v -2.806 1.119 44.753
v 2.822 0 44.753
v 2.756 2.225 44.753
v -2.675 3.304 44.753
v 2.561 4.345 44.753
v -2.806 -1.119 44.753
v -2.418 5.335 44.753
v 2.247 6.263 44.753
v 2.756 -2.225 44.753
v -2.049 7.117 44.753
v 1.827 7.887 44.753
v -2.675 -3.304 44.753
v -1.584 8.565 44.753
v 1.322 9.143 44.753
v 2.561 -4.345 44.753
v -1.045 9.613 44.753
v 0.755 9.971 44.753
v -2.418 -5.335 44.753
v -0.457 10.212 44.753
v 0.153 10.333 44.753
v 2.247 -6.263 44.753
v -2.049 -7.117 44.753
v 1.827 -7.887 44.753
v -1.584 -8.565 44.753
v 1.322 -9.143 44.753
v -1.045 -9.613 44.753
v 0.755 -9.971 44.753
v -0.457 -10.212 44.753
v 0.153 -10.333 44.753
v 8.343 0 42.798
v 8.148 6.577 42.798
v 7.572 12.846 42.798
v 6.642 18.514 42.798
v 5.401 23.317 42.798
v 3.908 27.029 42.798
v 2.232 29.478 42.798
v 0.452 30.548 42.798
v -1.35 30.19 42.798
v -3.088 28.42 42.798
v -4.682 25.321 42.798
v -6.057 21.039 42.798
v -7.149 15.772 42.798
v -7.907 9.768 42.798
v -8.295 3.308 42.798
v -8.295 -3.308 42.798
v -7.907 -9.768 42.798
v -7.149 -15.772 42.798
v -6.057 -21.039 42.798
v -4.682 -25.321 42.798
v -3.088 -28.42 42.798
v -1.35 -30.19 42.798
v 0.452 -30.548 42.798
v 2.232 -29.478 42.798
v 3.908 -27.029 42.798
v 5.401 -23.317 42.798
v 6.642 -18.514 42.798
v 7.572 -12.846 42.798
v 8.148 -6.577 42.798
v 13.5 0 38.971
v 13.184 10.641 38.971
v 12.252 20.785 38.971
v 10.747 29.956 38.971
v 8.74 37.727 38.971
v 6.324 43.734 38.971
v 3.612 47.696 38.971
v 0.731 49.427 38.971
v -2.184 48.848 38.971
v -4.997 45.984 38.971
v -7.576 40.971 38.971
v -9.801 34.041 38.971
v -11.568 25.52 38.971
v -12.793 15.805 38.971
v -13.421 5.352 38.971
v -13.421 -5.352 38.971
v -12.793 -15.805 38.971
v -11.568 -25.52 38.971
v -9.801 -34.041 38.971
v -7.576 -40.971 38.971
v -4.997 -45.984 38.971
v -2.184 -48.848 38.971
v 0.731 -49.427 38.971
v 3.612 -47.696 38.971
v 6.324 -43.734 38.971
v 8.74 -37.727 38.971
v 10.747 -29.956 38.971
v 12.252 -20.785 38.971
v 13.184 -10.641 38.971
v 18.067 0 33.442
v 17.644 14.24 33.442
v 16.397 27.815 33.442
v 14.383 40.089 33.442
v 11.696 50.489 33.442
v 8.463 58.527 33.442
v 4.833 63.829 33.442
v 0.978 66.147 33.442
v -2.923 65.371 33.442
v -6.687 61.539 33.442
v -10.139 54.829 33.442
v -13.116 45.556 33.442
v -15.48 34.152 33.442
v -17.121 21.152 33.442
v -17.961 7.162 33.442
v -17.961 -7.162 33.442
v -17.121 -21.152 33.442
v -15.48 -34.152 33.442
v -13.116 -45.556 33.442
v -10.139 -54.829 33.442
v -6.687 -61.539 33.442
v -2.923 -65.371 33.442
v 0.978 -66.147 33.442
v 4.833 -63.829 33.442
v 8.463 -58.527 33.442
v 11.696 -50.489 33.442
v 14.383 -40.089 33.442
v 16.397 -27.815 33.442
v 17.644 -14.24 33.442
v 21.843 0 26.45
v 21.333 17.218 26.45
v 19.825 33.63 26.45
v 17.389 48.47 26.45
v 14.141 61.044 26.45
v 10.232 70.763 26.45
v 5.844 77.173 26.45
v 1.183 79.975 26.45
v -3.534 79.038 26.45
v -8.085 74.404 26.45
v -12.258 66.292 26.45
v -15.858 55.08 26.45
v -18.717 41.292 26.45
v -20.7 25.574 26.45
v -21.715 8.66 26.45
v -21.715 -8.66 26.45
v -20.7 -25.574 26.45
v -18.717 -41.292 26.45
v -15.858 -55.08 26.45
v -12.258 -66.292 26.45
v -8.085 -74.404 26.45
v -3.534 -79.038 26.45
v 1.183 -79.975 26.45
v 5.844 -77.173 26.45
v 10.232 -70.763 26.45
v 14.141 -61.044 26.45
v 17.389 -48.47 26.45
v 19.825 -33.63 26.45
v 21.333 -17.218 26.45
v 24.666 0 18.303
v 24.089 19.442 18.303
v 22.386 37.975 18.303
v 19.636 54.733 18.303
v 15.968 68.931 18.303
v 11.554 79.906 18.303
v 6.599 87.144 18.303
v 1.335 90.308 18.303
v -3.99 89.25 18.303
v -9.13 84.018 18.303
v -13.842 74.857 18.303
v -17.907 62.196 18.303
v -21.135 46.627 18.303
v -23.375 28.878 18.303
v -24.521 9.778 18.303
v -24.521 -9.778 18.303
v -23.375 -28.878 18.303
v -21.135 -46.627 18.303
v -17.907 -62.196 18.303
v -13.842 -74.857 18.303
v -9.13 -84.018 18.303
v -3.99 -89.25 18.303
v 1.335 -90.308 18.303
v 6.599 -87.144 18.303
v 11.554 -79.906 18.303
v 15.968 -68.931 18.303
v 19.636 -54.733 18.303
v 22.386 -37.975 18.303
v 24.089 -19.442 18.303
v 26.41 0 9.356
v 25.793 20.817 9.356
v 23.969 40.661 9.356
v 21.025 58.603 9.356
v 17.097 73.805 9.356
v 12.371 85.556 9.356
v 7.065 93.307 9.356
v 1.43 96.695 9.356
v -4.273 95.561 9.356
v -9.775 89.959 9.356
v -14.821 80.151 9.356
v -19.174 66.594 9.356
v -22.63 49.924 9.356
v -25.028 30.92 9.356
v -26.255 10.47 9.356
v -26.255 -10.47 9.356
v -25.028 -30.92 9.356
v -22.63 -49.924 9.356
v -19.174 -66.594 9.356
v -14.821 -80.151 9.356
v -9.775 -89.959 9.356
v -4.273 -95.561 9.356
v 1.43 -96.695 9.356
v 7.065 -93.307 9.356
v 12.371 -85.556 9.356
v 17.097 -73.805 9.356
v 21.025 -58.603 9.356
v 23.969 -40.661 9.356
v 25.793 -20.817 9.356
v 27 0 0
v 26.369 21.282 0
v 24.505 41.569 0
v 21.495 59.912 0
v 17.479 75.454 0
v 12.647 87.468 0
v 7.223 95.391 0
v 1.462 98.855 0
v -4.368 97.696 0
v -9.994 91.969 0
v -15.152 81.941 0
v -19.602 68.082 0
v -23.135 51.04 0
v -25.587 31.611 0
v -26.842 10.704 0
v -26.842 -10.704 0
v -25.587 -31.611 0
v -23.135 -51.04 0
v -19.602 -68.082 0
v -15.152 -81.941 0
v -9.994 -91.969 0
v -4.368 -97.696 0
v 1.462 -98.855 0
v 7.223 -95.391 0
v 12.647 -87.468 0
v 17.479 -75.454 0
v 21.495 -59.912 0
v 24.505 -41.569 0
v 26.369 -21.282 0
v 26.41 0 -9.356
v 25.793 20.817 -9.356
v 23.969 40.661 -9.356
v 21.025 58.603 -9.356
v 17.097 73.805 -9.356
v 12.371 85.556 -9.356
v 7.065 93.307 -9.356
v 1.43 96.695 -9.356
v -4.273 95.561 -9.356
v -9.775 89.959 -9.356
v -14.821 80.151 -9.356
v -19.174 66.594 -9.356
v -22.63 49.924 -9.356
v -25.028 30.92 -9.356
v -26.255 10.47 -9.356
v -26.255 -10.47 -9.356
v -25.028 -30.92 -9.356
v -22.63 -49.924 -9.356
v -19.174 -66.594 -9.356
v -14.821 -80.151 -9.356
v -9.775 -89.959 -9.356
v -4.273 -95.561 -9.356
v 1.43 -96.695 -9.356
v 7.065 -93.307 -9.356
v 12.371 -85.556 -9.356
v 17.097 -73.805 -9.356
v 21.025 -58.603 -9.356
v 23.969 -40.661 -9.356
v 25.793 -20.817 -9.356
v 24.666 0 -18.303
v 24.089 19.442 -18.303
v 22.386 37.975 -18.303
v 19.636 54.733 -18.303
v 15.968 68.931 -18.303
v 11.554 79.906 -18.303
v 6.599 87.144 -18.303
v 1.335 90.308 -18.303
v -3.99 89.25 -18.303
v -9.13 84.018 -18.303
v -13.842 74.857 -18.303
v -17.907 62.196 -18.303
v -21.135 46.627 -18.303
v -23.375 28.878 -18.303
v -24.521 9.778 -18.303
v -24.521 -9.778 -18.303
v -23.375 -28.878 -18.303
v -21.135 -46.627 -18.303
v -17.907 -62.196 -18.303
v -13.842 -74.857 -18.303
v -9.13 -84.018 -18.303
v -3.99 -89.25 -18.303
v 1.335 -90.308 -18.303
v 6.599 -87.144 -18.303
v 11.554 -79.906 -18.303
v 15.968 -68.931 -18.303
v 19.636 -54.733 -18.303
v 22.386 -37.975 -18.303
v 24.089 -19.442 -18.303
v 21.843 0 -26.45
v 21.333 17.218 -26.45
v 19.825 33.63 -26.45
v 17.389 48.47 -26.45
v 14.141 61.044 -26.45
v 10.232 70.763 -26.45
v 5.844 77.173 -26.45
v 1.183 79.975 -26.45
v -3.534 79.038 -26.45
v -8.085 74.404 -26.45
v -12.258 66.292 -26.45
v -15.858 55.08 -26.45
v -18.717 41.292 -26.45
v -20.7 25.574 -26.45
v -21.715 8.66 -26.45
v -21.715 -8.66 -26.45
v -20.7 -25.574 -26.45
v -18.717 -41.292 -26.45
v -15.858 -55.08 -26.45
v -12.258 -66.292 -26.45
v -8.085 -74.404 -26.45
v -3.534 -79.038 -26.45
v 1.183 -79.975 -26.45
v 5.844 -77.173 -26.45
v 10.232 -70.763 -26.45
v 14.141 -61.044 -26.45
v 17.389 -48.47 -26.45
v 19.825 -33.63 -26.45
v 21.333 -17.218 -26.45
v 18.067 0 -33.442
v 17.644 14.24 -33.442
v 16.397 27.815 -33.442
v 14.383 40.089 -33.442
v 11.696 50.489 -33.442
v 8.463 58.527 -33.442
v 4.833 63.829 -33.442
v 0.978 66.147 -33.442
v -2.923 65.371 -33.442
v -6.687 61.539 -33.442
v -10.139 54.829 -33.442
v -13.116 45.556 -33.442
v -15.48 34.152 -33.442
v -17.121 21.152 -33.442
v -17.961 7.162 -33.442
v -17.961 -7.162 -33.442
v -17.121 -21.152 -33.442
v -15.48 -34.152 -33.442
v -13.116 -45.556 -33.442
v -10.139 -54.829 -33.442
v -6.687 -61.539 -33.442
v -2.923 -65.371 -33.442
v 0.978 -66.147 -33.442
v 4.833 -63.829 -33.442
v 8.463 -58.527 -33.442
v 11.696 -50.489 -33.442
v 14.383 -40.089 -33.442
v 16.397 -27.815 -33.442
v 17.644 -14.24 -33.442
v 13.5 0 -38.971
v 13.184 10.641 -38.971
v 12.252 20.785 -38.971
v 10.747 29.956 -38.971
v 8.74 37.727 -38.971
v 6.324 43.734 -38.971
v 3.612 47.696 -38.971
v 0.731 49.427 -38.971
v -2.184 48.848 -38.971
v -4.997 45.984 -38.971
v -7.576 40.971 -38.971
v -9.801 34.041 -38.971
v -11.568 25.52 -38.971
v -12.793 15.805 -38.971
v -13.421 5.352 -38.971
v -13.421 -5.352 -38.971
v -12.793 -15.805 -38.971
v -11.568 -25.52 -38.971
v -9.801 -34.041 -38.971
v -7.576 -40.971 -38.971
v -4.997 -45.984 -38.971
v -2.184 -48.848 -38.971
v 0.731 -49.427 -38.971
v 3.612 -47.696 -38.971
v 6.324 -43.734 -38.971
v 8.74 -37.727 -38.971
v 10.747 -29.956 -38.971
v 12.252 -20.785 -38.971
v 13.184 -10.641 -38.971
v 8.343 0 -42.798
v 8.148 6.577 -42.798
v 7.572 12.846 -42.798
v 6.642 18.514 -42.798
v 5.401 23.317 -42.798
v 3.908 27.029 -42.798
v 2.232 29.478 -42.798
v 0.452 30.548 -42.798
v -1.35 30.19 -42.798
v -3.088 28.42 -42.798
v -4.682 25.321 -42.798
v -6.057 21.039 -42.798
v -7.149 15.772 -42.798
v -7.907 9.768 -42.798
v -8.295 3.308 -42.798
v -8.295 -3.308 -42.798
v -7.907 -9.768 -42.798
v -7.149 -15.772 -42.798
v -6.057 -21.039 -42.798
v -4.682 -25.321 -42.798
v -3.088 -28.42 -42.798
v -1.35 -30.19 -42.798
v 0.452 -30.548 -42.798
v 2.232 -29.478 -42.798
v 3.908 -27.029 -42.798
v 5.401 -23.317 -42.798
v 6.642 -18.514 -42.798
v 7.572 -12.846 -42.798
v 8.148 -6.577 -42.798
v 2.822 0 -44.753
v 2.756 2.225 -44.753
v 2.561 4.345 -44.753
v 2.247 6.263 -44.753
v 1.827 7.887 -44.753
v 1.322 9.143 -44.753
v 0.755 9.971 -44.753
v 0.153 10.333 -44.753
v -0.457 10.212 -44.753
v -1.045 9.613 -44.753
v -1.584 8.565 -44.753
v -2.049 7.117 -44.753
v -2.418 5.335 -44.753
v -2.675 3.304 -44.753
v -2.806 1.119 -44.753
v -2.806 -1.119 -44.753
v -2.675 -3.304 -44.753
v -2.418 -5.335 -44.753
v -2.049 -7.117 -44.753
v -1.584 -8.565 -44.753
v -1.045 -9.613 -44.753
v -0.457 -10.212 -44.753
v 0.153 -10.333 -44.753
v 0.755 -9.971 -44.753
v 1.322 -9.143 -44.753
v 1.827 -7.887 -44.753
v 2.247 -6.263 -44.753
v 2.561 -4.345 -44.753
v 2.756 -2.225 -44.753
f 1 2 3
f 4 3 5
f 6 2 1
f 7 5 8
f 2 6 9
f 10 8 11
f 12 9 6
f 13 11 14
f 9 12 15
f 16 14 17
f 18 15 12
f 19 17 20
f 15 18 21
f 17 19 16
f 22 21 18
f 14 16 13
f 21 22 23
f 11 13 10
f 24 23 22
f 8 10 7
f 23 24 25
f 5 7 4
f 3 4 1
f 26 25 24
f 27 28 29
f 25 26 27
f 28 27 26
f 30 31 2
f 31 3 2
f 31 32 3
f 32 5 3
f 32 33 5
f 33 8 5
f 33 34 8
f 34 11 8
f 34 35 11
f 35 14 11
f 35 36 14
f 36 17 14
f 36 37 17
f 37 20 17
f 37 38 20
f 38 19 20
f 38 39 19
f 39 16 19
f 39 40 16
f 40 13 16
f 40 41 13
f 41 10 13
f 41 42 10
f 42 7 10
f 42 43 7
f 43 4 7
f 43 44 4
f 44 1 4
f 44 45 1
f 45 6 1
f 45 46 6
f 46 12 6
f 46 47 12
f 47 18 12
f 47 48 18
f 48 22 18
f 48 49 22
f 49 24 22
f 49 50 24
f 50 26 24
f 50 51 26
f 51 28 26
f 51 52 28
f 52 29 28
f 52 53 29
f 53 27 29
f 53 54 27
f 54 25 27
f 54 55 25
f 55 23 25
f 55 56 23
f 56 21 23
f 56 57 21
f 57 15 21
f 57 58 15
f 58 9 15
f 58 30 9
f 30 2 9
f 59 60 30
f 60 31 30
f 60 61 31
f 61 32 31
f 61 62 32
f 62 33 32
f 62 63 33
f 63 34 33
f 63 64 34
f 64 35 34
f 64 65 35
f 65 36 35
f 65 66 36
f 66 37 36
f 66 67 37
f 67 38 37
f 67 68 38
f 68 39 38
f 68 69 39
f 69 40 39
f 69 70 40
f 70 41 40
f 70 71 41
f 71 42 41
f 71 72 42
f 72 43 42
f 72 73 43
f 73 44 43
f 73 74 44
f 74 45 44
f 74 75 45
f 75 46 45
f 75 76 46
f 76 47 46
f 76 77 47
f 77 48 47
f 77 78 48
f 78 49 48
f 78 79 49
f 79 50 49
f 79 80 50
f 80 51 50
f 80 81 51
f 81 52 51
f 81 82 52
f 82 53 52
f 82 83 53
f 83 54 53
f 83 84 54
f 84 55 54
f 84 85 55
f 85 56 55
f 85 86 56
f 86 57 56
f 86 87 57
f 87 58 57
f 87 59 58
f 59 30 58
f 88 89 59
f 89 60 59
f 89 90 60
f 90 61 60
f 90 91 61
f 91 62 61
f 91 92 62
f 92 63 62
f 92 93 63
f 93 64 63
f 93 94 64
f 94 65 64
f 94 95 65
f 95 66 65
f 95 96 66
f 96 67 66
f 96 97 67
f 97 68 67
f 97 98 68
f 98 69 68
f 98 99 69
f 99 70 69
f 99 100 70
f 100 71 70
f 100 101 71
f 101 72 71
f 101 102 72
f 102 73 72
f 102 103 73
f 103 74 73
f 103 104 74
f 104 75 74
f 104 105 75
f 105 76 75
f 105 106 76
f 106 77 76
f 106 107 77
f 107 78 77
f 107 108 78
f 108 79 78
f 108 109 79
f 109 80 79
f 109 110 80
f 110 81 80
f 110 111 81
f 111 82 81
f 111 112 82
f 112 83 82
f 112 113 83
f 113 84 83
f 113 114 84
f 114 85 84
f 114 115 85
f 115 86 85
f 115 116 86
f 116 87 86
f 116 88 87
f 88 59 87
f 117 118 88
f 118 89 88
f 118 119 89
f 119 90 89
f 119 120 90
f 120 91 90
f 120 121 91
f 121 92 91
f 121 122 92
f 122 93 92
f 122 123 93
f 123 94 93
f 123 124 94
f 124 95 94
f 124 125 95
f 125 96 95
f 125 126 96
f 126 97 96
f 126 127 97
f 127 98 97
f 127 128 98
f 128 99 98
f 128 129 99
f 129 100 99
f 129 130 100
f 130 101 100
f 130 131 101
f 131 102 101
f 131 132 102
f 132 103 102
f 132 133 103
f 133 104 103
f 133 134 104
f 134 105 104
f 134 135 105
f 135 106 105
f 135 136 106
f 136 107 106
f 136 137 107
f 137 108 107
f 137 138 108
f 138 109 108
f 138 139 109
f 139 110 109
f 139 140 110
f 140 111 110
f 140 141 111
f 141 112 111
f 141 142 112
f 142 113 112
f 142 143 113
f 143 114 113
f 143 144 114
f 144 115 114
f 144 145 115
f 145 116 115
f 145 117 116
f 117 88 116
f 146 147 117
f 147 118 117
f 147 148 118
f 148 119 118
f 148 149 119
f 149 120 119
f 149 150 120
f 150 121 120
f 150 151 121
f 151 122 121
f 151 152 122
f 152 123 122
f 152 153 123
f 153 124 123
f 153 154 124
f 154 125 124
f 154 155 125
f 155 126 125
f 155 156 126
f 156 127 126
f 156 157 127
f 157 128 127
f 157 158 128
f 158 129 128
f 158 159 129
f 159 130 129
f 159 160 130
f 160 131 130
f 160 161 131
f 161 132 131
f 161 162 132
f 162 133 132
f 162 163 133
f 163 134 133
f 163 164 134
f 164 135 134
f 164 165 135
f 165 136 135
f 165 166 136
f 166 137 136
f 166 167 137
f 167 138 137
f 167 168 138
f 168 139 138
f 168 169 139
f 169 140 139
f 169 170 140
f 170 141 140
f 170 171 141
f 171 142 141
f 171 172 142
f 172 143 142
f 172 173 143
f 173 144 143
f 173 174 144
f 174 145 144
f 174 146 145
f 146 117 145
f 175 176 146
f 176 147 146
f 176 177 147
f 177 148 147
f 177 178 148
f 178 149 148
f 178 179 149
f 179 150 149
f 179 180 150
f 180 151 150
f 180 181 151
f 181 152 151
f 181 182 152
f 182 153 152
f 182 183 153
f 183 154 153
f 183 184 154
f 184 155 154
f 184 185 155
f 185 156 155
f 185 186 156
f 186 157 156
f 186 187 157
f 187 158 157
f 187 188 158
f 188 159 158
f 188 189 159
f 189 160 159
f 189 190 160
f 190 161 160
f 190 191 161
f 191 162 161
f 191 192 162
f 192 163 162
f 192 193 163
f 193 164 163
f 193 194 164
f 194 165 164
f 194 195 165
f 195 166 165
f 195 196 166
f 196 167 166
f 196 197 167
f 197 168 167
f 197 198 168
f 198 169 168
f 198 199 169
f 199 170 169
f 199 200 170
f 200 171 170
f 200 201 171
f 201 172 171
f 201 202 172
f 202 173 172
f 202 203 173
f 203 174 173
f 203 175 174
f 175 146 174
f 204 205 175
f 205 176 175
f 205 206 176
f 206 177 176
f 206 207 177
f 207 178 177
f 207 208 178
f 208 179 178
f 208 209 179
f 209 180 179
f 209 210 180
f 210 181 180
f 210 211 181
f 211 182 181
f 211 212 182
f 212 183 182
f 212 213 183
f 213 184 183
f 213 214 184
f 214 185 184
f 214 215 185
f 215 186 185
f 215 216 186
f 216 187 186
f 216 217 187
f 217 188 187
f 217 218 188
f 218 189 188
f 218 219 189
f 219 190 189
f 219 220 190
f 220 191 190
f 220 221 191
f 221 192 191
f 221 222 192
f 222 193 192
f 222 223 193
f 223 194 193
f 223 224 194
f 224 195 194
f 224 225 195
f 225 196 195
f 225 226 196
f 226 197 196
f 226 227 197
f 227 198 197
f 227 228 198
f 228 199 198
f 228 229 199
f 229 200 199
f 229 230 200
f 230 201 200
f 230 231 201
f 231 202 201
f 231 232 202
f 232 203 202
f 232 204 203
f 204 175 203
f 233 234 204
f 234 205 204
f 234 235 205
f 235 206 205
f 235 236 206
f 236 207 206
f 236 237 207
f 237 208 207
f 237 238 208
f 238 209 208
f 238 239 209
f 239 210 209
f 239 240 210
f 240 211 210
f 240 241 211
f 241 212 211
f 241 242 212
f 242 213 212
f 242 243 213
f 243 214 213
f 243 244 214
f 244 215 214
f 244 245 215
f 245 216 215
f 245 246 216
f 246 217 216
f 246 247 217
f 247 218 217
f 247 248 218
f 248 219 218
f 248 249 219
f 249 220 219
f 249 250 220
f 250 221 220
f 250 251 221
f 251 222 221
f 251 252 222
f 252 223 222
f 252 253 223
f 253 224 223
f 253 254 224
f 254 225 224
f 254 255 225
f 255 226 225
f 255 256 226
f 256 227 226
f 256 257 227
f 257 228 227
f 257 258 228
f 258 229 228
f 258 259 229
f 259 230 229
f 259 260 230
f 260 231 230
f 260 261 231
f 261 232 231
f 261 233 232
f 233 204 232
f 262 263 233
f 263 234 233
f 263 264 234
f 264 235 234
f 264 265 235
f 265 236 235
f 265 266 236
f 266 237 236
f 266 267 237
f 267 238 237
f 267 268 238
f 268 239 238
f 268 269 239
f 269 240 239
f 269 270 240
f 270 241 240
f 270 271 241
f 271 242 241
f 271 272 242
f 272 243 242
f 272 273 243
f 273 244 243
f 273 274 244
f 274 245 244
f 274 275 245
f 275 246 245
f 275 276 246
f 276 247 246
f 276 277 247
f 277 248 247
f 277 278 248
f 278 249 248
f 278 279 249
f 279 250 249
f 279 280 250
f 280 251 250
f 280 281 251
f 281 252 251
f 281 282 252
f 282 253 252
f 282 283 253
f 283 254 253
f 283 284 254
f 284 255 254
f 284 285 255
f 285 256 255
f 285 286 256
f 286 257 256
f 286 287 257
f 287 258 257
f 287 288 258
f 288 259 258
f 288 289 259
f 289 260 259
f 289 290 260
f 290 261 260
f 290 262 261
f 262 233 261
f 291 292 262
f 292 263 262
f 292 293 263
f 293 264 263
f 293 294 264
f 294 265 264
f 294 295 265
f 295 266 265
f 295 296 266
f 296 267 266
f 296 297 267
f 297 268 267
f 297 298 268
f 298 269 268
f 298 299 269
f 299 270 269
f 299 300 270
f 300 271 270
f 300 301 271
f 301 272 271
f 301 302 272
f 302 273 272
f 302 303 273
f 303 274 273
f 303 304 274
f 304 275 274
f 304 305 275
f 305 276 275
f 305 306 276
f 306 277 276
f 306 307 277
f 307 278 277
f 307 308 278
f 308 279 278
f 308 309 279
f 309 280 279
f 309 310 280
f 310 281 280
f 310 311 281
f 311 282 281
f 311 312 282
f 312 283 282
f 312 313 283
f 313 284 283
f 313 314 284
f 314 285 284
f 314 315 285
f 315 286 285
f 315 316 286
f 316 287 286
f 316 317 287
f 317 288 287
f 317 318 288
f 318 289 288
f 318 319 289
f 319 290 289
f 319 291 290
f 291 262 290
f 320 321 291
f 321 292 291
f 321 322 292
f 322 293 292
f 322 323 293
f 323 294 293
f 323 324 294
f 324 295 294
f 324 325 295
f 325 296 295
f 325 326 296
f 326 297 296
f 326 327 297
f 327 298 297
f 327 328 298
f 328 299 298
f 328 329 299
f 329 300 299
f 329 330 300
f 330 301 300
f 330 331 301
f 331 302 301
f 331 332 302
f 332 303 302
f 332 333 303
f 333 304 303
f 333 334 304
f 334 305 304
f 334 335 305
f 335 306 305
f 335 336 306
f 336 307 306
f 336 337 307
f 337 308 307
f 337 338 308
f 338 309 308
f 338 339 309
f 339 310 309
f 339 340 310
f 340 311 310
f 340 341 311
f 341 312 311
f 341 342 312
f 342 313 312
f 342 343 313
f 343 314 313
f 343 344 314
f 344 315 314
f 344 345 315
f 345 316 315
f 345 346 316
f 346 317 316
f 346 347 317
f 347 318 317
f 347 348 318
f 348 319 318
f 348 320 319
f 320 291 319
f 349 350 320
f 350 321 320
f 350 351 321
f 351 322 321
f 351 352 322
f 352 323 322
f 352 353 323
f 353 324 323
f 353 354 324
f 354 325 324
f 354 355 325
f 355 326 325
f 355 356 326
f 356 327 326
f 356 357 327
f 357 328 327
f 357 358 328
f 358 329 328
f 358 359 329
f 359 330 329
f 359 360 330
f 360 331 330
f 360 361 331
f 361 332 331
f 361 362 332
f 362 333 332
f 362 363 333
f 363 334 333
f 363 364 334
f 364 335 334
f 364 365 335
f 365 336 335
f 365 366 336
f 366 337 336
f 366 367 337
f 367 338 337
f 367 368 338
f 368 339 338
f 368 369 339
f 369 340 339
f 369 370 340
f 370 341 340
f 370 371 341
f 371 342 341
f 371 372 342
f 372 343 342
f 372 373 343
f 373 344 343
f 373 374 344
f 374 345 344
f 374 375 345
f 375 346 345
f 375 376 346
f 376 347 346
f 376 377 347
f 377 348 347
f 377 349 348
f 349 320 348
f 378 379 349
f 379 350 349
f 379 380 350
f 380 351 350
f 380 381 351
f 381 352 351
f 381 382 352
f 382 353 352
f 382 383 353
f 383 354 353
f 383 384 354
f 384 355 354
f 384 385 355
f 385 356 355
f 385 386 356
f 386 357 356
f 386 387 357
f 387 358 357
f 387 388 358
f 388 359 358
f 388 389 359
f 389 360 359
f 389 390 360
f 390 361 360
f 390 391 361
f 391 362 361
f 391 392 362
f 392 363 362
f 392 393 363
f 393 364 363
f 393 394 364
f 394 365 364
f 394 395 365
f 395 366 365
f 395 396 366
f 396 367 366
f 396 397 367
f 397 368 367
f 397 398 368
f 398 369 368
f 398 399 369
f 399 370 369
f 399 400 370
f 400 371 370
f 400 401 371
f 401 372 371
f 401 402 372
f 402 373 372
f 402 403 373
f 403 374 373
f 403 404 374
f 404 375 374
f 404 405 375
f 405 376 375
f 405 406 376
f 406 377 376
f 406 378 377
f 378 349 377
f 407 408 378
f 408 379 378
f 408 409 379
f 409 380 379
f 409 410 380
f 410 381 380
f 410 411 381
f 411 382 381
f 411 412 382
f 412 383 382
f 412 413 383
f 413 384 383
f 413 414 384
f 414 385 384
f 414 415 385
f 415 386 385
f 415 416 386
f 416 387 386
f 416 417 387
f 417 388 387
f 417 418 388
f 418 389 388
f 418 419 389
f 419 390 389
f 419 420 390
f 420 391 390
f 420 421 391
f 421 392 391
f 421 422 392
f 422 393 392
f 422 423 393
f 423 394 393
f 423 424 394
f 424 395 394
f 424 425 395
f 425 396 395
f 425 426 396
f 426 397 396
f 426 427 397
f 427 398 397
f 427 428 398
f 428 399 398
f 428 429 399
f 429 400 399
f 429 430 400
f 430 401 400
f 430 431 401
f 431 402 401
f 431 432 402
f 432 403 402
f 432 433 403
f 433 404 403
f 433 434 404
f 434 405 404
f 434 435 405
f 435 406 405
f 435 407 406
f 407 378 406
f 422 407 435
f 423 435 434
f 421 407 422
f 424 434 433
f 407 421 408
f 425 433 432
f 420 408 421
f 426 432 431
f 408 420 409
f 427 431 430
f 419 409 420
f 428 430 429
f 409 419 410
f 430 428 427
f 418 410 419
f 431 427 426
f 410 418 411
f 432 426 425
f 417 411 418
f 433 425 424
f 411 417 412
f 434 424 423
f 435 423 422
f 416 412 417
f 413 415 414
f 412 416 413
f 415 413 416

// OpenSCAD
// Generated by SolidPython 1.0.1 on 2020-07-29 00:46:45


scale(v = [3, 11, 5]) {
	sphere(r = 9);
}
/***********************************************
*********      SolidPython code:      **********
************************************************
 
# import packages: SolidPython
from solid import *
from solid.utils import *
from itertools import chain, combinations, permutations


class Resize:

    def __init__(self, scad_file):
        self.scad_file = scad_file
        #self.scad_file = import_scad(scad_file)
        # cone/cylinder param:
        self.r1 = 0
        self.r2 = 0
        self.h = 0
        # rectangular prism param:
        self.w = 0
        self.l = 0
        # ellipse param:
        self.r = 0

    # import OpenScad code (file name corresponds to shape)


    # classify shape + parameters
    def assign(self, param1, param2, param3):
        if self.scad_file == 'cone.scad':
            self.r1 = param1
            self.r2 = param2
            self.h = param3
        elif self.scad_file == 'cylinder.scad':
            self.r1 = param1
            self.r2 = param2
            self.h = param3
        elif self.scad_file == 'rectangularPrism.scad':
            self.h = param1
            self.l = param2
            self.w = param3
        else:
            self.r = param1
            self.h = param2

    # resize parameters
    def iterate(self):
        x = range(3, 20, 2)
        i = 1
        if self.scad_file == 'cone.scad':
            tempList = list(permutations(x, 2))
            for temp in tempList:
                param1 = temp[0]
                param2 = temp[1]
                filepath = 'produced_scad_files/' + 'cone' + str(param1) + '_' + str(param2) + '_' + '.scad'
                scad_render_to_file(cylinder(h=param1, r1=param2, r2=0), filepath)

        elif self.scad_file == 'cylinder.scad':
            tempList = list(permutations(x, 3))
            for temp in tempList:
                param1 = temp[0]
                param2 = temp[1]
                filepath = 'produced_scad_files/' + 'cylinder' + str(param1) + '_' + str(param2) + '_' + '.scad'
                scad_render_to_file(cylinder(h=param1, r1=param2, r2=param2), filepath)

        elif self.scad_file == 'rectangularPrism.scad':
            tempList = list(permutations(x, 3))
            for temp in tempList:
                param1 = temp[0]
                param2 = temp[1]
                param3 = temp[2]
                filepath = 'produced_scad_files/' + 'rectangularPrism' + str(param1) + '_' + str(param2) + '_' + str(
                    param3) + '.scad'
                scad_render_to_file(cube(size=(param1, param2, param3)), filepath)

        elif self.scad_file == 'ellipse.scad':
            tempList = list(permutations(x, 4))
            for temp in tempList:
                param1 = temp[0]
                param2 = temp[1]
                param3 = temp[2]
                param4 = temp[3]
                filepath = 'produced_scad_files/' + 'ellipse' + str(param1) + '_' + str(param2) + '_' + str(param3) + '_' + str(param4) + '.scad'
                scad_render_to_file(scale([param1, param2, param3])(sphere(r=param4)), filepath)

    def render_to_scadfile(self):
        scad_render_to_file(scad, 'example.scad') 
 
************************************************/
